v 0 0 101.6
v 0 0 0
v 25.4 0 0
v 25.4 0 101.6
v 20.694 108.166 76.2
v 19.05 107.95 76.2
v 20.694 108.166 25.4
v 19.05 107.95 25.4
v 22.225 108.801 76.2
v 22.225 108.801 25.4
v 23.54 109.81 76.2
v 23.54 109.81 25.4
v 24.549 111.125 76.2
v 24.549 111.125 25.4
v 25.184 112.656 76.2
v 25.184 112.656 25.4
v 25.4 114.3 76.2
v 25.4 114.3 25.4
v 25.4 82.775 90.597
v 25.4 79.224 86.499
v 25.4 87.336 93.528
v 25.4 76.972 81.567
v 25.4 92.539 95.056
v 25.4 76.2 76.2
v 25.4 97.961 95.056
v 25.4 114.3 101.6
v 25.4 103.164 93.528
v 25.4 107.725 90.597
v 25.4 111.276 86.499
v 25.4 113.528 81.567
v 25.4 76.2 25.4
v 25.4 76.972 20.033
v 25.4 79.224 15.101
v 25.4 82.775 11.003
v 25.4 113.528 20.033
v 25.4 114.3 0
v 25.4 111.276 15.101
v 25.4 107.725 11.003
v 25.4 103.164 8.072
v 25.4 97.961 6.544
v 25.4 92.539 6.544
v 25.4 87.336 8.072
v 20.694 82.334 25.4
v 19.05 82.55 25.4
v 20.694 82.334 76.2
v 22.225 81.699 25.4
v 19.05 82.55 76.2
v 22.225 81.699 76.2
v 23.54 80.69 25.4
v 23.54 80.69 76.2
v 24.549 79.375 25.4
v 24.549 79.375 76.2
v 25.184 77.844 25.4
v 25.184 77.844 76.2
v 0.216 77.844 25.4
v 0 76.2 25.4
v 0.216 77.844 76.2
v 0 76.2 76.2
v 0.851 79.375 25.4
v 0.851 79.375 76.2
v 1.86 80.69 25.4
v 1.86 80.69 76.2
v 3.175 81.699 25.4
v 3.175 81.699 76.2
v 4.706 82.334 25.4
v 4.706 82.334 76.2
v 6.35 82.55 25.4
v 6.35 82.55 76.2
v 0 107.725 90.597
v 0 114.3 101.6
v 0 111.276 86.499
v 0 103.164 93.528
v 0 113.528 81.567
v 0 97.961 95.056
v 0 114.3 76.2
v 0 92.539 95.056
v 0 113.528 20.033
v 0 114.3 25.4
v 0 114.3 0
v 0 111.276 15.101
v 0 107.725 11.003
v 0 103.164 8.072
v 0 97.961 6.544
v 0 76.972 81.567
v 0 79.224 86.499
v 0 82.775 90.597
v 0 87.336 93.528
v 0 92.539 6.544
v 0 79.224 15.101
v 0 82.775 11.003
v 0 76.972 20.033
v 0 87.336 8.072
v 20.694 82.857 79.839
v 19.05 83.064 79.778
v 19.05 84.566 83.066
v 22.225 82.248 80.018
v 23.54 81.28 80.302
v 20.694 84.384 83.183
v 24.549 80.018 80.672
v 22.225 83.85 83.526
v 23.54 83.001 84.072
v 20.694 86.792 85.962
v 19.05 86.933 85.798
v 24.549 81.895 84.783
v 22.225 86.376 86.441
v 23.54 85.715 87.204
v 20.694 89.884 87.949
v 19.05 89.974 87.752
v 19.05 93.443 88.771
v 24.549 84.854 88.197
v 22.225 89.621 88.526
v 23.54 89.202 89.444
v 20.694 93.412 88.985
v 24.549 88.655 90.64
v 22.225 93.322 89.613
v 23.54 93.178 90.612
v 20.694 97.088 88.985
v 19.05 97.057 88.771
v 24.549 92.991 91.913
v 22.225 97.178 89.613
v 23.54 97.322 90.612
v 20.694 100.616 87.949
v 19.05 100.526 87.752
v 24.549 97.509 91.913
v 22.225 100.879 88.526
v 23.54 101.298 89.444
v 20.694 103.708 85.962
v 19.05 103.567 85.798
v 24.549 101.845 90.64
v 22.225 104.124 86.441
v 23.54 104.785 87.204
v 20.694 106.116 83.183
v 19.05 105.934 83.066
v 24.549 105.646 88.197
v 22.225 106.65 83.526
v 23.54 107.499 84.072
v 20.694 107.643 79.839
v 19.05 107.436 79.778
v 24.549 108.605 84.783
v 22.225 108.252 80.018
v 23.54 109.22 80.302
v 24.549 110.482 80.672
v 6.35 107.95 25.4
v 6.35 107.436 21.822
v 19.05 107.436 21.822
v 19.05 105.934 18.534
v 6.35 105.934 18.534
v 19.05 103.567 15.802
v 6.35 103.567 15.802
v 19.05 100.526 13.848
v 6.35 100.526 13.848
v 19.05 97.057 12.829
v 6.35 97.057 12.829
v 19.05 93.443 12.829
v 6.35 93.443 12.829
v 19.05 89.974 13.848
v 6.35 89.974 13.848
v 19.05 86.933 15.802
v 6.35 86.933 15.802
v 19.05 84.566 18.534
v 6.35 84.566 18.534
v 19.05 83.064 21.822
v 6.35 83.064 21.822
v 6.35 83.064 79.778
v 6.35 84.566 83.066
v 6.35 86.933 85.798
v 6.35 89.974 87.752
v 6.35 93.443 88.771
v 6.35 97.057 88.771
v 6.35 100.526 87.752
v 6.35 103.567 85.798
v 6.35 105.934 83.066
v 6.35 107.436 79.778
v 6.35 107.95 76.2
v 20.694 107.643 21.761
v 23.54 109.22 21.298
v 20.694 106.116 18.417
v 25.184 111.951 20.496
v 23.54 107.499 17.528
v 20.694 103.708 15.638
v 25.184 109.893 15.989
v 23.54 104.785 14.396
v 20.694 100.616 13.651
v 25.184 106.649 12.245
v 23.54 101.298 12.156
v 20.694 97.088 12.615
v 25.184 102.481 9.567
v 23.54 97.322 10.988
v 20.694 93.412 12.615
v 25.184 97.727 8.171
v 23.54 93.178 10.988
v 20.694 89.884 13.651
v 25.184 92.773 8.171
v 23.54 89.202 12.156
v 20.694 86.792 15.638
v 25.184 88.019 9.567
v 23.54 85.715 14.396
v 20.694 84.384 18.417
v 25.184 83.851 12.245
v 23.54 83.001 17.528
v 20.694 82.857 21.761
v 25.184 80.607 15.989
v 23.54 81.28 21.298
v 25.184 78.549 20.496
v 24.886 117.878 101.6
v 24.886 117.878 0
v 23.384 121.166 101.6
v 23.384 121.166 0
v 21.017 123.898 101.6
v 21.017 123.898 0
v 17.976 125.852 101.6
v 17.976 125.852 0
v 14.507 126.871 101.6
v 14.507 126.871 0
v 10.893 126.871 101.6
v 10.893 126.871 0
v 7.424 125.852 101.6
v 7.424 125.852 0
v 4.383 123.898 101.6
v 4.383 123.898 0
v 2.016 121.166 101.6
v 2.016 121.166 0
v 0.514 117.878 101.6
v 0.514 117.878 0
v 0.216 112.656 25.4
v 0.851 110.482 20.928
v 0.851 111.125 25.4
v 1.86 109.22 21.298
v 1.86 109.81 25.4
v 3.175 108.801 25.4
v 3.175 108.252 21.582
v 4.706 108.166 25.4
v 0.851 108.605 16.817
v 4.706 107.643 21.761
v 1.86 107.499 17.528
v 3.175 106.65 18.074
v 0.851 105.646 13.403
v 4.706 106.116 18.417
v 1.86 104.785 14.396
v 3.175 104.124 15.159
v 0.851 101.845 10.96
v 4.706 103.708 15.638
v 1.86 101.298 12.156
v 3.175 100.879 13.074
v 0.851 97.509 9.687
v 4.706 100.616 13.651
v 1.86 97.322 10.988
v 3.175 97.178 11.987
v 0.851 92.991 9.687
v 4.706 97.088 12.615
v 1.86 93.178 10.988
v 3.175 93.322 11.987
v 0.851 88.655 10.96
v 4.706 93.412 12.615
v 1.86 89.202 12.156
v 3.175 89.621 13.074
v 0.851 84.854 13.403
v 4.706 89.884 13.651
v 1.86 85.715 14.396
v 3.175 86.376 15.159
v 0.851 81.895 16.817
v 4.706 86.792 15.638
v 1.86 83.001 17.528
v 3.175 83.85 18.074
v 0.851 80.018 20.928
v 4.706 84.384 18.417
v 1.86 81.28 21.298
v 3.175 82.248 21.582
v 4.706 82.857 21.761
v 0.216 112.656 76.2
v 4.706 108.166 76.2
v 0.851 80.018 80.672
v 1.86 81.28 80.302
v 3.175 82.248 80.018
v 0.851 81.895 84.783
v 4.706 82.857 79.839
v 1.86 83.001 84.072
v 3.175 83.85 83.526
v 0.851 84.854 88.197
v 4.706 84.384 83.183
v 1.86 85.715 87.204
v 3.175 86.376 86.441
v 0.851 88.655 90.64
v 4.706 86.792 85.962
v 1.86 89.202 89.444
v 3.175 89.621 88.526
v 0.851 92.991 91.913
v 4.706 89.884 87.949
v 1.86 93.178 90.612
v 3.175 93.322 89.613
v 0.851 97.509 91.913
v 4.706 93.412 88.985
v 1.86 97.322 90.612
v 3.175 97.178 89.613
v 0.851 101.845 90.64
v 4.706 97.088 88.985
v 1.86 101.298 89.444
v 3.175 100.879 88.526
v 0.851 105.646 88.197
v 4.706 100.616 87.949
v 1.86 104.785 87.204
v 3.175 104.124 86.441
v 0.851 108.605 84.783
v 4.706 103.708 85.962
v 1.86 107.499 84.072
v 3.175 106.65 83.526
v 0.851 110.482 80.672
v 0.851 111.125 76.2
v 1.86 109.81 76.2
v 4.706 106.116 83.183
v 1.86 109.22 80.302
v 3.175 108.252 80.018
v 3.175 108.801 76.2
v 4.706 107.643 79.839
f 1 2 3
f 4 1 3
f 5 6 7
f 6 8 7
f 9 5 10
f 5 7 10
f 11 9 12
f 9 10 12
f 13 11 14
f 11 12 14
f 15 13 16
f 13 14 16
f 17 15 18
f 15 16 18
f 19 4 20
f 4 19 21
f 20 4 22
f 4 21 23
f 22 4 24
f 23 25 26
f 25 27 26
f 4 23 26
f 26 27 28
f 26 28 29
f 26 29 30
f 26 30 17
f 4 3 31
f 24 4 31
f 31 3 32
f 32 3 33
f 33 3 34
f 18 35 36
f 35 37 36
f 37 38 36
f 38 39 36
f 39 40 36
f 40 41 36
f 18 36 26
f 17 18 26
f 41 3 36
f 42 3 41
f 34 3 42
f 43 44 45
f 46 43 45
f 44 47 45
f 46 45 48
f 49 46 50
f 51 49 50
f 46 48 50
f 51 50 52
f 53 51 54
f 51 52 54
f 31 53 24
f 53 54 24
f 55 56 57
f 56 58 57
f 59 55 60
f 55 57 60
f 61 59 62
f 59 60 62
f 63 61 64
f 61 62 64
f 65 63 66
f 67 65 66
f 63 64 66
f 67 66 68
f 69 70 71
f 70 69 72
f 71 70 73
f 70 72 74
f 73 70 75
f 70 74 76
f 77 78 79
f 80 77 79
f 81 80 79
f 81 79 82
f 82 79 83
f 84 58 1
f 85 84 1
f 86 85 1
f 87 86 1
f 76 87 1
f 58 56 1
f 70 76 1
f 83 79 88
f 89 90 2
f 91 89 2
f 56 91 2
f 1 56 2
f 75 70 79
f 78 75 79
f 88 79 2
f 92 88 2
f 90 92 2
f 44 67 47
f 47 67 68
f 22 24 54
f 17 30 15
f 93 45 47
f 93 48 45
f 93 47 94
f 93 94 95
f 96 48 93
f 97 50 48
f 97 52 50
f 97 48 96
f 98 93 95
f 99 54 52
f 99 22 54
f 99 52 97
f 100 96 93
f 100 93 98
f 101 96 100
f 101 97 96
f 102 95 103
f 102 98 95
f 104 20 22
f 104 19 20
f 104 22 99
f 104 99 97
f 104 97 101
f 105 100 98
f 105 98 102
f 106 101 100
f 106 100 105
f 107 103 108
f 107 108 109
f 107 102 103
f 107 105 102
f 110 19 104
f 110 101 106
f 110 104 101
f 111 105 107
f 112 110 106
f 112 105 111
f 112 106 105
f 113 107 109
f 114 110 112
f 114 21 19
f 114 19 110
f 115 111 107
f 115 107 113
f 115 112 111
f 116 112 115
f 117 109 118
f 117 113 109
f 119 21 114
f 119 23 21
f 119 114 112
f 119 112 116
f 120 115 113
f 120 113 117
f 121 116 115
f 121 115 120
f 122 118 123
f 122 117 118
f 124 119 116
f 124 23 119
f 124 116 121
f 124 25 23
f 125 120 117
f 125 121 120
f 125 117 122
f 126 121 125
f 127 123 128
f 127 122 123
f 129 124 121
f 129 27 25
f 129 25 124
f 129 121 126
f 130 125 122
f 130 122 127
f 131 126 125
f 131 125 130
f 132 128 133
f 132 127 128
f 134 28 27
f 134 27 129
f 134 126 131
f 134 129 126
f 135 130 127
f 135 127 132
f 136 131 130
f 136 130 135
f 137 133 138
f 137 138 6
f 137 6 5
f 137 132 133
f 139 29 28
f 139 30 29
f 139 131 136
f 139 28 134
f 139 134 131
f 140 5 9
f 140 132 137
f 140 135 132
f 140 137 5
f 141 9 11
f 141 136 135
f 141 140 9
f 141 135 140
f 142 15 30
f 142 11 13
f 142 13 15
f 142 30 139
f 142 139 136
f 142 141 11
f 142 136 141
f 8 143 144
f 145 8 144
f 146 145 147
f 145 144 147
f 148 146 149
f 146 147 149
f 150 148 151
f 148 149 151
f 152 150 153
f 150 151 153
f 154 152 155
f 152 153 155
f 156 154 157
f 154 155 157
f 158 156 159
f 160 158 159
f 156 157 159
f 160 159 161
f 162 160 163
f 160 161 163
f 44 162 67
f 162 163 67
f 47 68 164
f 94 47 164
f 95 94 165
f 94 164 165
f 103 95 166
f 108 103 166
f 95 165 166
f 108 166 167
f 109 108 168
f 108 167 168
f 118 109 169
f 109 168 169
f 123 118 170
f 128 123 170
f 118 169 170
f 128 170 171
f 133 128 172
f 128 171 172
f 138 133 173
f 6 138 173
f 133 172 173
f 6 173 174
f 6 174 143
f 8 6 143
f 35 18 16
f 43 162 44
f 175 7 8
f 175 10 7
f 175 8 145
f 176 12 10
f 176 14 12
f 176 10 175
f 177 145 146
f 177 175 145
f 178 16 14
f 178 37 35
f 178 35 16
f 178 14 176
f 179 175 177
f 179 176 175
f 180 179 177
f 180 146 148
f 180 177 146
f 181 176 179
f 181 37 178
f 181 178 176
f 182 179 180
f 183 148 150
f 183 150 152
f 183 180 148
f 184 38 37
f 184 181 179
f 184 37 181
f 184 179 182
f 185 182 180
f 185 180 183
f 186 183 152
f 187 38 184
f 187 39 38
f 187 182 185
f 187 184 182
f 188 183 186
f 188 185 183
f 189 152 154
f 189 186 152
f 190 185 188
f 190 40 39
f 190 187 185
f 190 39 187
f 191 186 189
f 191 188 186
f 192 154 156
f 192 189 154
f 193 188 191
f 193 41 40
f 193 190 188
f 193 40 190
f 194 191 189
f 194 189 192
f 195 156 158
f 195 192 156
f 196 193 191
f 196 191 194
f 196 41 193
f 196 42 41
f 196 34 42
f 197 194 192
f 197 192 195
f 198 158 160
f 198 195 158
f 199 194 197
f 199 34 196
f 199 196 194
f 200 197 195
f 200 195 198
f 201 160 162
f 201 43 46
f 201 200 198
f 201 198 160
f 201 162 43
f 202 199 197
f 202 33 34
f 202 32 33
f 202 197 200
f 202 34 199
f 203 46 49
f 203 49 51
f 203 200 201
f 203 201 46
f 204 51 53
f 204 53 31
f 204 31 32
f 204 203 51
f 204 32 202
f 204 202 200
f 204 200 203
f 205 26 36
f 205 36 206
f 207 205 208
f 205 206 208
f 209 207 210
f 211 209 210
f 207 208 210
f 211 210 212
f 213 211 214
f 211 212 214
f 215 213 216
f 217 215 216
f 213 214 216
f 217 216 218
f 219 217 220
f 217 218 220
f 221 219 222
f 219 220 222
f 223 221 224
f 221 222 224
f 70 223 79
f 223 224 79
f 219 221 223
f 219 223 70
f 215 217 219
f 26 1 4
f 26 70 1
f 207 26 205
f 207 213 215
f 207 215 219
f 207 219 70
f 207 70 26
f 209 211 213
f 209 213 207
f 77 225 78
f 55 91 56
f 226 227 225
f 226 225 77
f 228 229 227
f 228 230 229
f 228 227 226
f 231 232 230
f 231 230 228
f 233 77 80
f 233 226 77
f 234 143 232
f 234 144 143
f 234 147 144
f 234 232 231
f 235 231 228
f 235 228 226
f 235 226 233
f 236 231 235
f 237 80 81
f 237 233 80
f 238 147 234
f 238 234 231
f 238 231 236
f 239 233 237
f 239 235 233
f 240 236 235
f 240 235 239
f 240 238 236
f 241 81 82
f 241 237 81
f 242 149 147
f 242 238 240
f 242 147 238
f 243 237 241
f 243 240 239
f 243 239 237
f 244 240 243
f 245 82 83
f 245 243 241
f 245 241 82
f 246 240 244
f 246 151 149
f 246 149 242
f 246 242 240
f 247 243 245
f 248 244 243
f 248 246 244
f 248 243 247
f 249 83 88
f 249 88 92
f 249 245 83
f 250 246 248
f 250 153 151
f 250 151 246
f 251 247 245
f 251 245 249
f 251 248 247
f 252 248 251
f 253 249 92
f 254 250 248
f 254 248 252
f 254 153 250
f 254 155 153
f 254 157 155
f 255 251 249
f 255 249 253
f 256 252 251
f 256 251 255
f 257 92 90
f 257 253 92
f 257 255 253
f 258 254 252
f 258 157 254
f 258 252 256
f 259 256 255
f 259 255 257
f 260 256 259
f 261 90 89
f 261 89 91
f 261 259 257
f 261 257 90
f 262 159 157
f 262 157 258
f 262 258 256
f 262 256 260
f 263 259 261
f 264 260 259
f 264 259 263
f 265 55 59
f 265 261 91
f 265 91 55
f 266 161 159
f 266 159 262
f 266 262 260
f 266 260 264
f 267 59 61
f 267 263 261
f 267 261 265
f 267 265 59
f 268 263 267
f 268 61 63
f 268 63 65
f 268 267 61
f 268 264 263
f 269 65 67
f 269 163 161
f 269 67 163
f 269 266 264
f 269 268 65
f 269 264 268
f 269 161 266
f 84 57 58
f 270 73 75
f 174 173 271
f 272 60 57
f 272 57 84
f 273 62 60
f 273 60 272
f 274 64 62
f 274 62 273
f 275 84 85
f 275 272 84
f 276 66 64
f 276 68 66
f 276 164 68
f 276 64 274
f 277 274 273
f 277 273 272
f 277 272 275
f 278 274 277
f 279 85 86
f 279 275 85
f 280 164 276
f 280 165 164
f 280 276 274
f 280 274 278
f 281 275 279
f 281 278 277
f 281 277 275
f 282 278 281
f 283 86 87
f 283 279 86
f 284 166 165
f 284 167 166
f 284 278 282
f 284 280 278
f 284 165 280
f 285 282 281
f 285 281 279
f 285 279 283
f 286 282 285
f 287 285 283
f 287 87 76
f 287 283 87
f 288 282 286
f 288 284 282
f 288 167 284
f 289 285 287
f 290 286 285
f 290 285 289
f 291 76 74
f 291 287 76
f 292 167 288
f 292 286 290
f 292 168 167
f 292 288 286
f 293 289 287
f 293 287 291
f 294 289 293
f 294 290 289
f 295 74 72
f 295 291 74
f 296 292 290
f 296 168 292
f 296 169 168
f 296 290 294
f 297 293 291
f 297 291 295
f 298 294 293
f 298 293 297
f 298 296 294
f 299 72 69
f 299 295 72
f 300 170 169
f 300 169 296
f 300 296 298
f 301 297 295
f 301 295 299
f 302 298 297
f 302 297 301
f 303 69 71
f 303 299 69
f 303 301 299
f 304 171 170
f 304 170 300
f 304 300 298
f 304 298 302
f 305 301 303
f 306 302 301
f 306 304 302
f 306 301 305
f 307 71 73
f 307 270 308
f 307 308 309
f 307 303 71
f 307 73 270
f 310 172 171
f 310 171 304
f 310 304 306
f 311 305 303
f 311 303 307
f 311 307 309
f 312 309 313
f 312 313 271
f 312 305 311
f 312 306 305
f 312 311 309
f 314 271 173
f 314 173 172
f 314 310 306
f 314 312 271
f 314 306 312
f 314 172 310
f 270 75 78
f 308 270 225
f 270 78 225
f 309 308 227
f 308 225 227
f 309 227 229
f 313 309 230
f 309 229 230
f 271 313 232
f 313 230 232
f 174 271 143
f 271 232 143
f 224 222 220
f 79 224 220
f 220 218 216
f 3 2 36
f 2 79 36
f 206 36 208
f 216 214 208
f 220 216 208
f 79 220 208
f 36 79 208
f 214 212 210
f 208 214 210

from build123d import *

# Parameters (mm, degrees)
BOSS_EXTRUDE1_DEPTH     = 101.6
CUT_EXTRUDE1_DEPTH      = 165.61081374
CUT_EXTRUDE1_DEPTH_BACK = 165.61081374
FILLET6_R               = 6.35
FILLET7_R               = 6.35


with BuildPart() as part:
    # Sketch1 → Boss-Extrude1 (new body)
    with BuildSketch(Plane.XY):
        with BuildLine():
            Line((0, 0), (25.4, 0))
            Line((25.4, 0), (25.4, 114.3))
            ThreePointArc((25.4, 114.3), (12.7, 127), (0, 114.3))
            Line((0, 114.3), (0, 0))
        make_face()
    extrude(amount=BOSS_EXTRUDE1_DEPTH)

    # Sketch2 → Cut-Extrude1 (cut, two sides: drawn at the far end of the back side and taken through both)
    with BuildSketch(Plane(origin=(25.4, 0, 0), x_dir=(0, 0, -1), z_dir=(1, 0, 0)).offset(-CUT_EXTRUDE1_DEPTH_BACK)):
        with BuildLine():
            Line((-76.2, 107.95), (-25.4, 107.95))
            ThreePointArc((-25.4, 107.95), (-12.7, 95.25), (-25.4, 82.55))
            Line((-25.4, 82.55), (-76.2, 82.55))
            ThreePointArc((-76.2, 82.55), (-88.9, 95.25), (-76.2, 107.95))
        make_face()
    extrude(amount=CUT_EXTRUDE1_DEPTH + CUT_EXTRUDE1_DEPTH_BACK, mode=Mode.SUBTRACT)

    # Fillet6
    fillet6_edges = [part.edges().sort_by_distance(p)[0] for p in [
        (0, 95.25, 88.9),
        (0, 95.25, 12.7),
        (0, 82.55, 50.8),
        (0, 107.95, 50.8),
    ]]
    fillet(fillet6_edges, radius=FILLET6_R - 0.0001)  # a hair under: the kernel refuses the full size

    # Fillet7
    fillet7_edges = [part.edges().sort_by_distance(p)[0] for p in [
        (25.4, 82.55, 50.8),
        (25.4, 95.25, 12.7),
        (25.4, 107.95, 50.8),
        (25.4, 95.25, 88.9),
    ]]
    fillet(fillet7_edges, radius=FILLET7_R - 0.0001)  # a hair under: the kernel refuses the full size


solid = part.part
